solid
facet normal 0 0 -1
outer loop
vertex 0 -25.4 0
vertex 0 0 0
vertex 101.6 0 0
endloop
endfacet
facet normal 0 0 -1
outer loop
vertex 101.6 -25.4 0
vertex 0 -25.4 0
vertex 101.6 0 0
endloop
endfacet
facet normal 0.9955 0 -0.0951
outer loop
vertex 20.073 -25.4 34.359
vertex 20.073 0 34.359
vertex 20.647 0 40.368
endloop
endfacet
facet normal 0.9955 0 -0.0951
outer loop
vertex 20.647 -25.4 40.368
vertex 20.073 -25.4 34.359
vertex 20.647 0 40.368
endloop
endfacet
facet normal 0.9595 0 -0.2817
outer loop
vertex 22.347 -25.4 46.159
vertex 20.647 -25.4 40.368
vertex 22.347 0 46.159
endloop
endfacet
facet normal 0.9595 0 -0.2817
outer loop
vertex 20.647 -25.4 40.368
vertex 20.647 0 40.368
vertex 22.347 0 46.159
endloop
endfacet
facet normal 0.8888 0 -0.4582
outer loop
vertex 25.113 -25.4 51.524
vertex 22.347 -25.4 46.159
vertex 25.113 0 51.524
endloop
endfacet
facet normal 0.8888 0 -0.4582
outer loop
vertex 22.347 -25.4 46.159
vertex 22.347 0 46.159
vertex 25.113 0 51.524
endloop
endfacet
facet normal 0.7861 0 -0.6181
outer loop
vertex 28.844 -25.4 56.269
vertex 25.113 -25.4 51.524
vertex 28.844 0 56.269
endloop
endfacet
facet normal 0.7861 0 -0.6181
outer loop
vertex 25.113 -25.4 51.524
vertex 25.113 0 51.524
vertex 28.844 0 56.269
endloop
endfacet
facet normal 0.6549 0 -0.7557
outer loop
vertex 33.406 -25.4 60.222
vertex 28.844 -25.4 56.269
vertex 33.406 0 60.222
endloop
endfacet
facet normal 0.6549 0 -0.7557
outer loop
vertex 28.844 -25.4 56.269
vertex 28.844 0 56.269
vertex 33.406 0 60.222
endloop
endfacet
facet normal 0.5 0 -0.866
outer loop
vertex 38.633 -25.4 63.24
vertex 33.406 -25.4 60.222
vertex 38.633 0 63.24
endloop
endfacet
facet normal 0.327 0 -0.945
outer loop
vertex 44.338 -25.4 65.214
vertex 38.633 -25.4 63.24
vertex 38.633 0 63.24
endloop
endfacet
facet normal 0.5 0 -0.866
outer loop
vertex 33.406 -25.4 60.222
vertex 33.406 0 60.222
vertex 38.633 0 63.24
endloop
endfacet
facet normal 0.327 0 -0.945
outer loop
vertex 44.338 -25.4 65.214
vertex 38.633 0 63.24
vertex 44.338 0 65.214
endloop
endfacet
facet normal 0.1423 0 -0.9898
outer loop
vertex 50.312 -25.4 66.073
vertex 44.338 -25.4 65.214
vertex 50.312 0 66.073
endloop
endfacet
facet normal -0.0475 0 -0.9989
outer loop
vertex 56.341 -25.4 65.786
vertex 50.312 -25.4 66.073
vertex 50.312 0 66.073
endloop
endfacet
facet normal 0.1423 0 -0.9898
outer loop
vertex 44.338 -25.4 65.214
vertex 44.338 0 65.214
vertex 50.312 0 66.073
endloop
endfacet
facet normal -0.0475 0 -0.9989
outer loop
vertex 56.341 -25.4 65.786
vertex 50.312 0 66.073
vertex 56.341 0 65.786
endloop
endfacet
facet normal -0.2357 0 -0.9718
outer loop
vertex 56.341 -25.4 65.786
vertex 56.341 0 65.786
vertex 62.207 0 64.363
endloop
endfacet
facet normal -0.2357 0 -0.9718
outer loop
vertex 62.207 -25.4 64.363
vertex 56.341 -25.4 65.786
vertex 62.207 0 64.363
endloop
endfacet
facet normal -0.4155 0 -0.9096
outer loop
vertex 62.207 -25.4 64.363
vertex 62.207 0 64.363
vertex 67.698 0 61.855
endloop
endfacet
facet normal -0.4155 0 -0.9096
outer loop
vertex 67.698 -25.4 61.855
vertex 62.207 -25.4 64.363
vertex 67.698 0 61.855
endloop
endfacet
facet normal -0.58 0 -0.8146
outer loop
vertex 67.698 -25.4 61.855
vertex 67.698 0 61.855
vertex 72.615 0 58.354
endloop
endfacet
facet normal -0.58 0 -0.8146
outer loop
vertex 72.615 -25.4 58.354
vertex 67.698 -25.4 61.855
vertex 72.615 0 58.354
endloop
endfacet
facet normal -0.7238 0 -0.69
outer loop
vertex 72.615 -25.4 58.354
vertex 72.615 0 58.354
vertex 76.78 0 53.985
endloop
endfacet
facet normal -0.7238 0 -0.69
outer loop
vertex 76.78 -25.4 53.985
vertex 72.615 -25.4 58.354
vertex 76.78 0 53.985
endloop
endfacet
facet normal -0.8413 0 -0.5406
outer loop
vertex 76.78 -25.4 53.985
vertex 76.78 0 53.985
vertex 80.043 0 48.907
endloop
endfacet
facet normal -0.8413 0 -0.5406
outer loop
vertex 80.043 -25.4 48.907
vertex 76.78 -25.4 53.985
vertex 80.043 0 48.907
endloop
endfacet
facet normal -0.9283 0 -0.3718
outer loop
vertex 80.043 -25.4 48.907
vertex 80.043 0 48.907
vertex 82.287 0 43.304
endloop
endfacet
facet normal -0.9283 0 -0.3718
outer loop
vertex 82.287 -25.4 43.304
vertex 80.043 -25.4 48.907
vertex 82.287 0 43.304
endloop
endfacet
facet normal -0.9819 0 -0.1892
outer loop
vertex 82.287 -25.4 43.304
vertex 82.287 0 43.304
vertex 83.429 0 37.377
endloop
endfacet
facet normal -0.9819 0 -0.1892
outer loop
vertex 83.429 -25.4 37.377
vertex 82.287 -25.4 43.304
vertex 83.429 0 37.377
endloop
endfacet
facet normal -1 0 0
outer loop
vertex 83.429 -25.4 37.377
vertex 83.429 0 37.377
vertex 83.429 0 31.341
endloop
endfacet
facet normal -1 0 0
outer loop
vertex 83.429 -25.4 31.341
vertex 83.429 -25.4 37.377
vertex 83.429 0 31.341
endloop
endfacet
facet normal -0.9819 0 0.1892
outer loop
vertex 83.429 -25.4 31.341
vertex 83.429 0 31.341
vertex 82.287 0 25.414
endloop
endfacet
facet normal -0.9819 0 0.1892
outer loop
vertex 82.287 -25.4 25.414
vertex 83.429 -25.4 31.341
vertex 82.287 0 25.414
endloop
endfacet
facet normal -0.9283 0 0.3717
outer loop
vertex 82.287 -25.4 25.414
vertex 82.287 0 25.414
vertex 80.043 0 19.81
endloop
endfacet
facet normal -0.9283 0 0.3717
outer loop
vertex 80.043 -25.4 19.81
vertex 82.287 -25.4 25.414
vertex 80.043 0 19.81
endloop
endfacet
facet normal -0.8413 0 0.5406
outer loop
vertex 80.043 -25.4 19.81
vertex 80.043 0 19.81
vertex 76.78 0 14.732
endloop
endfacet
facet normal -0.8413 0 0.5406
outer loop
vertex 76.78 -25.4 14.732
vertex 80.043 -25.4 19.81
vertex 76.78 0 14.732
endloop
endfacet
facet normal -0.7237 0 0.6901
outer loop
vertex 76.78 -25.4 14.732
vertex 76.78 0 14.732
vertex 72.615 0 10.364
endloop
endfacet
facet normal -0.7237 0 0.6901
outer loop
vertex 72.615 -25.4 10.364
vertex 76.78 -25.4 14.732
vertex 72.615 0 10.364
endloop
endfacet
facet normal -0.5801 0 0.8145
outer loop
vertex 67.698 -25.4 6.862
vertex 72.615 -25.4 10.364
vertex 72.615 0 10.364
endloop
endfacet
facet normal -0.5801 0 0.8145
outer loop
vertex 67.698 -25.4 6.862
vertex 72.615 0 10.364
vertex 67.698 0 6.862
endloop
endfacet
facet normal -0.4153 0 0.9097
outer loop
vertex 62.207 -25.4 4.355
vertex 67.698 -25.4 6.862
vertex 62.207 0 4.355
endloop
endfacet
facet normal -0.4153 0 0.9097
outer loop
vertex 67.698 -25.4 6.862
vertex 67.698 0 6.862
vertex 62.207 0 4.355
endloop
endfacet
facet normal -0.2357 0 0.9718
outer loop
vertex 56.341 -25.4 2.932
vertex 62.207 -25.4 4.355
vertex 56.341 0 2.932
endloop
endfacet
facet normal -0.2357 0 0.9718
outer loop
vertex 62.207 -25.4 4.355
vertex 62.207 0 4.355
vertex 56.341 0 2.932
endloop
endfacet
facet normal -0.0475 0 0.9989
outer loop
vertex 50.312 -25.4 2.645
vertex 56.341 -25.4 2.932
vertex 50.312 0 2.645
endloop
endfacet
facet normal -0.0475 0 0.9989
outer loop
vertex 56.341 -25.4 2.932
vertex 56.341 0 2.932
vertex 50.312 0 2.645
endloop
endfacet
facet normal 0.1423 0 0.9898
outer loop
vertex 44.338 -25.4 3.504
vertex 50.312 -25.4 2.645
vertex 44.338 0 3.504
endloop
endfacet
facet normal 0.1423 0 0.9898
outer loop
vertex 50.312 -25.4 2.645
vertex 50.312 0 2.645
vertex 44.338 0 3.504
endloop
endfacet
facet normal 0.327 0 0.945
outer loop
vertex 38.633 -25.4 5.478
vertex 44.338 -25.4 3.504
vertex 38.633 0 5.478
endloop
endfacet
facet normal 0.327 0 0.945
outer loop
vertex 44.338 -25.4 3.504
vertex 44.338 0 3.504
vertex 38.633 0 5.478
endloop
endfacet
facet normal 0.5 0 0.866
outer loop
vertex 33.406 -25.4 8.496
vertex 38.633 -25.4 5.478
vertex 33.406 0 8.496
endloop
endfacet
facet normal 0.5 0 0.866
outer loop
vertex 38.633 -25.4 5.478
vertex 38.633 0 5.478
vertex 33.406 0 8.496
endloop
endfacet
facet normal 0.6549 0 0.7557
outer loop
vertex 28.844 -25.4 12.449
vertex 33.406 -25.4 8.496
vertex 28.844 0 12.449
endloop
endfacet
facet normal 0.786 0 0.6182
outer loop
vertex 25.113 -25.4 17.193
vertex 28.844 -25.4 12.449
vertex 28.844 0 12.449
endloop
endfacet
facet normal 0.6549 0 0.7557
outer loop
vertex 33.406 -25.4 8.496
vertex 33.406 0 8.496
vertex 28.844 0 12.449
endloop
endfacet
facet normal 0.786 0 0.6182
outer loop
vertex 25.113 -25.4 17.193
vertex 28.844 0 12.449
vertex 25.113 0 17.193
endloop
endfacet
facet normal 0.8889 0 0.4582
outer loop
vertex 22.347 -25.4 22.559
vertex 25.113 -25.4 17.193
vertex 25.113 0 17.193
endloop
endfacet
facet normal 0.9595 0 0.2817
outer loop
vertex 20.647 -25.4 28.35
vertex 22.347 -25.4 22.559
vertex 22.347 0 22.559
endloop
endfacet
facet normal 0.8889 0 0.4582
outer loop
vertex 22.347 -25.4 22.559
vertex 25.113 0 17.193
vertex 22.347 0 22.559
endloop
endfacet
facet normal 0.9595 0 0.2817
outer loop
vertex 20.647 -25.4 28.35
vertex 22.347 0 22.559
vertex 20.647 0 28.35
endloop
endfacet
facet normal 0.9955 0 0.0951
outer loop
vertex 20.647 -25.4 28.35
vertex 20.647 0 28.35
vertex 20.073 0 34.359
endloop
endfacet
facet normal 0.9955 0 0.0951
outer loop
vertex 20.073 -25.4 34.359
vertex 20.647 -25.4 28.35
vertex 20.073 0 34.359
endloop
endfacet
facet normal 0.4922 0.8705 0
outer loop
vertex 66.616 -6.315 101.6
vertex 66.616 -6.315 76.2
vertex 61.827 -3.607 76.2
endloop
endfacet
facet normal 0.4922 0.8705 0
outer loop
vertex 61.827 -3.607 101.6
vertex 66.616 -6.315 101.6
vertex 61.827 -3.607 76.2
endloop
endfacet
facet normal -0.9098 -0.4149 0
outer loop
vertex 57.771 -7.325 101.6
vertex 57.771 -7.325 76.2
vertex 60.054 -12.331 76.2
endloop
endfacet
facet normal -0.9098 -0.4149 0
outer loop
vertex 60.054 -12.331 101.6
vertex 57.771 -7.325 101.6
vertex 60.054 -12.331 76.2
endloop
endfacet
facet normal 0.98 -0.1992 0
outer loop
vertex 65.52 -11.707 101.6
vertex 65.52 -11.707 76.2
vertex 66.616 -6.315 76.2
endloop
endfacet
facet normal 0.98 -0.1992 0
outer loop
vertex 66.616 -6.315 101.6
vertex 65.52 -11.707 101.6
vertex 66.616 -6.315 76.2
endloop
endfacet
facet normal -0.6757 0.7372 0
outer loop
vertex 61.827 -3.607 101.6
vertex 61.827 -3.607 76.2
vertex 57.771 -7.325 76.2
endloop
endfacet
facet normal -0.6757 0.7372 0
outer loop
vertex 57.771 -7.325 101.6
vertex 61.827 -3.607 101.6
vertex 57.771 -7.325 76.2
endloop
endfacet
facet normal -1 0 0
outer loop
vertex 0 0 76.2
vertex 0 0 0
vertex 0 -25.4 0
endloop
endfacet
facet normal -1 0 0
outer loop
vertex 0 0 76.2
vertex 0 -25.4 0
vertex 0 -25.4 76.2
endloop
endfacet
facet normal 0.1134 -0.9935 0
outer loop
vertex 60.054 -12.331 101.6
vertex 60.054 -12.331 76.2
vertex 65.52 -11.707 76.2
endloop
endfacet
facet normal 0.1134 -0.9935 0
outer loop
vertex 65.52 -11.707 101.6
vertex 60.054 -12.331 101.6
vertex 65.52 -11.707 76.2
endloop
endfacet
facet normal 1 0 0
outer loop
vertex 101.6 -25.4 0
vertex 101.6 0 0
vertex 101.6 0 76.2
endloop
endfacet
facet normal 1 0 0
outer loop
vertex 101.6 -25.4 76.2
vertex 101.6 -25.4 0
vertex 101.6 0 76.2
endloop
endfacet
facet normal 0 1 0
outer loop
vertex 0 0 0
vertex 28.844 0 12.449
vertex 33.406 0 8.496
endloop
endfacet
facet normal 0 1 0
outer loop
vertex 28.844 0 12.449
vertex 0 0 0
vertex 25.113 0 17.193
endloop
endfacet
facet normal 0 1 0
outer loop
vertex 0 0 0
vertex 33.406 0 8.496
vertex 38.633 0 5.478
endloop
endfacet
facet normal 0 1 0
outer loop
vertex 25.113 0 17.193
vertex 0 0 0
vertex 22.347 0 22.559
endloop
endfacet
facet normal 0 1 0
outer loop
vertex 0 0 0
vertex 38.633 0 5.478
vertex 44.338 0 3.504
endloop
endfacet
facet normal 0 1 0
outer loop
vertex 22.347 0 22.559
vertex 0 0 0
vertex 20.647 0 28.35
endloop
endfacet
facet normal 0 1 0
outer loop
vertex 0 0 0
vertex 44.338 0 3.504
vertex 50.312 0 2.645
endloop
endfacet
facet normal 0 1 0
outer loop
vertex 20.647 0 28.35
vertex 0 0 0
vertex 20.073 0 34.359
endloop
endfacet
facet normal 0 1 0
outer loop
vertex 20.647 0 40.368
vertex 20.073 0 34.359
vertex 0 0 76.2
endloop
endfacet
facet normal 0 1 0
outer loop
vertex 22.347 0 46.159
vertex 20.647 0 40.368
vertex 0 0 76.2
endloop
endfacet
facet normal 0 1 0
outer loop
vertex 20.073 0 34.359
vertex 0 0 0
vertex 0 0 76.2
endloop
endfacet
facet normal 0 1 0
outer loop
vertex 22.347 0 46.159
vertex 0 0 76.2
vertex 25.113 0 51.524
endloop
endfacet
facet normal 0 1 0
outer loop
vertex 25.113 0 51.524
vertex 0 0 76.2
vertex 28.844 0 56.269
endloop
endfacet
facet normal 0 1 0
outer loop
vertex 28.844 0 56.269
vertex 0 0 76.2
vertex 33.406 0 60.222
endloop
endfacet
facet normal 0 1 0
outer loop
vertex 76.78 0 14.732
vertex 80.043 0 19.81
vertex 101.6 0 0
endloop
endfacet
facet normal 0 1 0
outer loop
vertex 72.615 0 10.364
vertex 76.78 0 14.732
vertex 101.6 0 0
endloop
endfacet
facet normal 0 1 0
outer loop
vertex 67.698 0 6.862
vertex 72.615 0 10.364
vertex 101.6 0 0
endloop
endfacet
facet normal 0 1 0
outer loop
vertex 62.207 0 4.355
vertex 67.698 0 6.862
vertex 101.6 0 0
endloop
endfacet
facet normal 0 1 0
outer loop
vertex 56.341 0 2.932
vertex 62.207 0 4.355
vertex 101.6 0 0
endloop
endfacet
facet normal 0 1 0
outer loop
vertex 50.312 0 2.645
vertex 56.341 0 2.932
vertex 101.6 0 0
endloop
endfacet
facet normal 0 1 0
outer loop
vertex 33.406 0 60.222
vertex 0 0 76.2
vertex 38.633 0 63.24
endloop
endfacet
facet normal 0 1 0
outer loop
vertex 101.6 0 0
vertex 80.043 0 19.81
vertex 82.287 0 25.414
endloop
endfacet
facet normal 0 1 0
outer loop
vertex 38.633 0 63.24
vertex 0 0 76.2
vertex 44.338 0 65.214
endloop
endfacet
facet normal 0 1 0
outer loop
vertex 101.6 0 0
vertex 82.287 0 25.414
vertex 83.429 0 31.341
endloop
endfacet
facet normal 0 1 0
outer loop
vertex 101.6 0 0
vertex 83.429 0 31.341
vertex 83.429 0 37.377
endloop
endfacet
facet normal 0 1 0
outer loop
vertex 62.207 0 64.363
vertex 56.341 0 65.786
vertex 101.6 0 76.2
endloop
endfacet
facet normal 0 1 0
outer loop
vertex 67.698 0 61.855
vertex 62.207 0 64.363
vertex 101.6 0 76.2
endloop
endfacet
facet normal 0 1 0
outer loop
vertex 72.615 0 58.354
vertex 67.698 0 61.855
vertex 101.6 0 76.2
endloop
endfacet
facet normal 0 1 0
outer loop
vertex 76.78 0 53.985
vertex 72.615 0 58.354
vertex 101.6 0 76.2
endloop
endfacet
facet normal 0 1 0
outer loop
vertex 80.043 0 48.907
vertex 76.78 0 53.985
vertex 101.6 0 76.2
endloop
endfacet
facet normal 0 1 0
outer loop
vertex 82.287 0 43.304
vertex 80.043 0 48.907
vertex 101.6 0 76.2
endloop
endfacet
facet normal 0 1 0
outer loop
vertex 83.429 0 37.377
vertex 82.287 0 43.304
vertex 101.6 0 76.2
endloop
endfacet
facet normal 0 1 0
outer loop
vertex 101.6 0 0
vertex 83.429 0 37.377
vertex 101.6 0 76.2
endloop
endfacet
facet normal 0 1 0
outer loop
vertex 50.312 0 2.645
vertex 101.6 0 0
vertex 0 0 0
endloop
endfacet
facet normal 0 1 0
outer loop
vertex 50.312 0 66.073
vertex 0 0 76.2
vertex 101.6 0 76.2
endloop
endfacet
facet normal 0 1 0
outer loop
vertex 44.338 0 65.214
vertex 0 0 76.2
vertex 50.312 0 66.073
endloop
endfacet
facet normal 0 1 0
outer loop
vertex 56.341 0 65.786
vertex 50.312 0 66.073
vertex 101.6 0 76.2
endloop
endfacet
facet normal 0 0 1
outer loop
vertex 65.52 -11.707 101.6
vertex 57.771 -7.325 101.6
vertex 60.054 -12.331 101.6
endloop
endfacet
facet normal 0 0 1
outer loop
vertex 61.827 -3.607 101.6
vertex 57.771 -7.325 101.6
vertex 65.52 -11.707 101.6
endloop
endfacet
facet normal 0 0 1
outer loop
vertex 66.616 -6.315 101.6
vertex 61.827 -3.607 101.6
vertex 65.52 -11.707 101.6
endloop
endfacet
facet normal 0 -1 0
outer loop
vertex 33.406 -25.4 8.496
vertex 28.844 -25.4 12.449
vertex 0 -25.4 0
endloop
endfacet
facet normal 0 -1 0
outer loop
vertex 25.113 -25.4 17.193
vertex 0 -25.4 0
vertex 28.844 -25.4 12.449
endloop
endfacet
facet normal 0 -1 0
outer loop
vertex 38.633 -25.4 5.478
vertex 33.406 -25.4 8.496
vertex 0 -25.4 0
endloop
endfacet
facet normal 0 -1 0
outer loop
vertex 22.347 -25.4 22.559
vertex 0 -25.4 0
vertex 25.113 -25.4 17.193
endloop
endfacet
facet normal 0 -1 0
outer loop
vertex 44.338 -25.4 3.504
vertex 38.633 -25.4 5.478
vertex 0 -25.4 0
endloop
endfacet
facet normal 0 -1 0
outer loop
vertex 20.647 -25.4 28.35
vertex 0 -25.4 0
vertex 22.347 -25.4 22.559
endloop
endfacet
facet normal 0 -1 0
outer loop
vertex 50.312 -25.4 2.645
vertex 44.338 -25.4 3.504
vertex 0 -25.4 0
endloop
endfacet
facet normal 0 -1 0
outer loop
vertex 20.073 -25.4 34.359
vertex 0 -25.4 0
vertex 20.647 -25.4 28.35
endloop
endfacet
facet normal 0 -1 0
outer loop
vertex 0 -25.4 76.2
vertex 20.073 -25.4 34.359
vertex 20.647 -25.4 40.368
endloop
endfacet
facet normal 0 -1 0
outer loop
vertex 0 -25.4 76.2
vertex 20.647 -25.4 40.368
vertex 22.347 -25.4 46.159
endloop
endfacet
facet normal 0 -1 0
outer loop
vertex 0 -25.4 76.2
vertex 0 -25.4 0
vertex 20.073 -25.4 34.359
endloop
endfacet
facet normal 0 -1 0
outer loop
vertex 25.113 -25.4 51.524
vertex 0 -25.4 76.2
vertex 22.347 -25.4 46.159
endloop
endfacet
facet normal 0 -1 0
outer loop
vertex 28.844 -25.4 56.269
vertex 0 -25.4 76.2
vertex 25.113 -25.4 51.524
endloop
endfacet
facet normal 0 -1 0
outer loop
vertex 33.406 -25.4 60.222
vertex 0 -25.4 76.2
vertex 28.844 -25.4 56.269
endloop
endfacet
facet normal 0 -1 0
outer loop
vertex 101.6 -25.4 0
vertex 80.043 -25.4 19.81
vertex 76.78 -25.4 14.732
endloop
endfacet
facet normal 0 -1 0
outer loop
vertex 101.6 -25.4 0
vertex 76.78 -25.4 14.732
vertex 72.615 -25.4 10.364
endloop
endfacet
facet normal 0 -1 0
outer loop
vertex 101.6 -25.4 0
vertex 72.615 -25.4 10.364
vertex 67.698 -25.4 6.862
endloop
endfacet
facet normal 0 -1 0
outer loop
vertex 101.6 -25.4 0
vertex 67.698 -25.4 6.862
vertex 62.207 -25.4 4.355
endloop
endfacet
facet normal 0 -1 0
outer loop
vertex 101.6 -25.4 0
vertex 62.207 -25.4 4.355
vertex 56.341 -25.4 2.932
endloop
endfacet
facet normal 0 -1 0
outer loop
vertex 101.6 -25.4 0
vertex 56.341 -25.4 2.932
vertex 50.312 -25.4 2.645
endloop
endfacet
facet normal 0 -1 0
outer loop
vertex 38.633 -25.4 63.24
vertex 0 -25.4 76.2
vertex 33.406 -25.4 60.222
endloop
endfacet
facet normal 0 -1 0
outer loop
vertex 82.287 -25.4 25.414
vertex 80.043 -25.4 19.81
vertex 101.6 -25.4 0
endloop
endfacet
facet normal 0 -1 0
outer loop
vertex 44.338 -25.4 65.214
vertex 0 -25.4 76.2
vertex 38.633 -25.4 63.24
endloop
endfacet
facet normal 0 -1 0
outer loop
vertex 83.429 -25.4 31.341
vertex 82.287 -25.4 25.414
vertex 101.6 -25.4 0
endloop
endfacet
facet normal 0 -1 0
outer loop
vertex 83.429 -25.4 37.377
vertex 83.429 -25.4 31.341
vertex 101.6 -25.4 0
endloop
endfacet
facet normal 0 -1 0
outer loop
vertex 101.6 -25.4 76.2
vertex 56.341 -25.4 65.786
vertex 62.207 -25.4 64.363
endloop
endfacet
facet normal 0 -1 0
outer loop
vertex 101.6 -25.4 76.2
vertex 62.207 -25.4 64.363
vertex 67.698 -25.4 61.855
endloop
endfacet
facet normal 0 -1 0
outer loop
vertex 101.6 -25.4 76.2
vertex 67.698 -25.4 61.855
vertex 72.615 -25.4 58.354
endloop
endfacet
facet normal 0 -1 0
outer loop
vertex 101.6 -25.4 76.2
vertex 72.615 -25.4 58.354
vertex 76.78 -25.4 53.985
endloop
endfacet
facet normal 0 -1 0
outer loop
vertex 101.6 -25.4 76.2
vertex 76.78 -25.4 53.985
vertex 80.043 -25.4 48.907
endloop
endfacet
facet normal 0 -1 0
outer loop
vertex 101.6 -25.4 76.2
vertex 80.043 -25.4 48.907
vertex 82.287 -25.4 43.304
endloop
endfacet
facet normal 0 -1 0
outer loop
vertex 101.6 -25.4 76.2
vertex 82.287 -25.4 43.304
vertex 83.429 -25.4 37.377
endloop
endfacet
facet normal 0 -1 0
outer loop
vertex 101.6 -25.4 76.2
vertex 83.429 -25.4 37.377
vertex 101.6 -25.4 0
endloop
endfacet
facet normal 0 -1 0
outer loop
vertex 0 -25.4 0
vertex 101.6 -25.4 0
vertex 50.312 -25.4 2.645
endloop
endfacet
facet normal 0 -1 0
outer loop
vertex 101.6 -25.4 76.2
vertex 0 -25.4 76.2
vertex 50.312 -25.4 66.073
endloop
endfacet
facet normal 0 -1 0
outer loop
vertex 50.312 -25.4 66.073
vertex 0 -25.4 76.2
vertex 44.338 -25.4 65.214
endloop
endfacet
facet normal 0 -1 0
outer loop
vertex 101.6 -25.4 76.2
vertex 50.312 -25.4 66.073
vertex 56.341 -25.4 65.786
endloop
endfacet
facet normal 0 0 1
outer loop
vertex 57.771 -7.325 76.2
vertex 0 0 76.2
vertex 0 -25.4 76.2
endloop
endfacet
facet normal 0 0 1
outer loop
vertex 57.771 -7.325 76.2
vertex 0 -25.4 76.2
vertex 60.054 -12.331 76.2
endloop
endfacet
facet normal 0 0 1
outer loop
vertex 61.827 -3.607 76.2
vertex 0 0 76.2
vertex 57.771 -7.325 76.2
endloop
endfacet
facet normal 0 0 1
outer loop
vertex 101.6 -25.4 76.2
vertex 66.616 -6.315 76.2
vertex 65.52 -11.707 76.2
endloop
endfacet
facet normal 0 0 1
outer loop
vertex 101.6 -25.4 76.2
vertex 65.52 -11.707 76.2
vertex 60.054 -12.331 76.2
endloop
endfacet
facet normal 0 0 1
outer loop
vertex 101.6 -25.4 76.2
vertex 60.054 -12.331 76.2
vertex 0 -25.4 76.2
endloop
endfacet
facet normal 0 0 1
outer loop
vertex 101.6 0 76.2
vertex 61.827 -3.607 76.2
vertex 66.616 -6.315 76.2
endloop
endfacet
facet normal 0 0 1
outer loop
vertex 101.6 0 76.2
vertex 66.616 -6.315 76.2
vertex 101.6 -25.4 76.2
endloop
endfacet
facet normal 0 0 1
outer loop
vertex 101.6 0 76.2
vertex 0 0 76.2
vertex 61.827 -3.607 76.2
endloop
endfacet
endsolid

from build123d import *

# Parameters (mm, degrees)
F0_W     = 101.6
F0_H     = 76.2
F1_DEPTH = 25.4
F3_D     = 63.5
F5_DEPTH = 25.4


with BuildPart() as f1:
    # F0 (on Front) → F1 (new body)
    with BuildSketch(Plane.XZ):
        with Locations((50.8, 38.1)):
            Rectangle(F0_W, F0_H)
    extrude(amount=F1_DEPTH)

    # F3 (through all)
    with Locations(Plane.XZ.offset(25.4)):
        with Locations((51.822923, 34.358785)):
            Hole(F3_D / 2)

    # F4 (on face) → F5 (join)
    with BuildSketch(Plane.XY.offset(76.2)):
        Polygon((61.826725, -3.606968), (57.771097, -7.324631), (60.053547, -12.330584), (65.519807, -11.706769), (66.615691, -6.315278), align=None)
    extrude(amount=F5_DEPTH)


solid = f1.part
